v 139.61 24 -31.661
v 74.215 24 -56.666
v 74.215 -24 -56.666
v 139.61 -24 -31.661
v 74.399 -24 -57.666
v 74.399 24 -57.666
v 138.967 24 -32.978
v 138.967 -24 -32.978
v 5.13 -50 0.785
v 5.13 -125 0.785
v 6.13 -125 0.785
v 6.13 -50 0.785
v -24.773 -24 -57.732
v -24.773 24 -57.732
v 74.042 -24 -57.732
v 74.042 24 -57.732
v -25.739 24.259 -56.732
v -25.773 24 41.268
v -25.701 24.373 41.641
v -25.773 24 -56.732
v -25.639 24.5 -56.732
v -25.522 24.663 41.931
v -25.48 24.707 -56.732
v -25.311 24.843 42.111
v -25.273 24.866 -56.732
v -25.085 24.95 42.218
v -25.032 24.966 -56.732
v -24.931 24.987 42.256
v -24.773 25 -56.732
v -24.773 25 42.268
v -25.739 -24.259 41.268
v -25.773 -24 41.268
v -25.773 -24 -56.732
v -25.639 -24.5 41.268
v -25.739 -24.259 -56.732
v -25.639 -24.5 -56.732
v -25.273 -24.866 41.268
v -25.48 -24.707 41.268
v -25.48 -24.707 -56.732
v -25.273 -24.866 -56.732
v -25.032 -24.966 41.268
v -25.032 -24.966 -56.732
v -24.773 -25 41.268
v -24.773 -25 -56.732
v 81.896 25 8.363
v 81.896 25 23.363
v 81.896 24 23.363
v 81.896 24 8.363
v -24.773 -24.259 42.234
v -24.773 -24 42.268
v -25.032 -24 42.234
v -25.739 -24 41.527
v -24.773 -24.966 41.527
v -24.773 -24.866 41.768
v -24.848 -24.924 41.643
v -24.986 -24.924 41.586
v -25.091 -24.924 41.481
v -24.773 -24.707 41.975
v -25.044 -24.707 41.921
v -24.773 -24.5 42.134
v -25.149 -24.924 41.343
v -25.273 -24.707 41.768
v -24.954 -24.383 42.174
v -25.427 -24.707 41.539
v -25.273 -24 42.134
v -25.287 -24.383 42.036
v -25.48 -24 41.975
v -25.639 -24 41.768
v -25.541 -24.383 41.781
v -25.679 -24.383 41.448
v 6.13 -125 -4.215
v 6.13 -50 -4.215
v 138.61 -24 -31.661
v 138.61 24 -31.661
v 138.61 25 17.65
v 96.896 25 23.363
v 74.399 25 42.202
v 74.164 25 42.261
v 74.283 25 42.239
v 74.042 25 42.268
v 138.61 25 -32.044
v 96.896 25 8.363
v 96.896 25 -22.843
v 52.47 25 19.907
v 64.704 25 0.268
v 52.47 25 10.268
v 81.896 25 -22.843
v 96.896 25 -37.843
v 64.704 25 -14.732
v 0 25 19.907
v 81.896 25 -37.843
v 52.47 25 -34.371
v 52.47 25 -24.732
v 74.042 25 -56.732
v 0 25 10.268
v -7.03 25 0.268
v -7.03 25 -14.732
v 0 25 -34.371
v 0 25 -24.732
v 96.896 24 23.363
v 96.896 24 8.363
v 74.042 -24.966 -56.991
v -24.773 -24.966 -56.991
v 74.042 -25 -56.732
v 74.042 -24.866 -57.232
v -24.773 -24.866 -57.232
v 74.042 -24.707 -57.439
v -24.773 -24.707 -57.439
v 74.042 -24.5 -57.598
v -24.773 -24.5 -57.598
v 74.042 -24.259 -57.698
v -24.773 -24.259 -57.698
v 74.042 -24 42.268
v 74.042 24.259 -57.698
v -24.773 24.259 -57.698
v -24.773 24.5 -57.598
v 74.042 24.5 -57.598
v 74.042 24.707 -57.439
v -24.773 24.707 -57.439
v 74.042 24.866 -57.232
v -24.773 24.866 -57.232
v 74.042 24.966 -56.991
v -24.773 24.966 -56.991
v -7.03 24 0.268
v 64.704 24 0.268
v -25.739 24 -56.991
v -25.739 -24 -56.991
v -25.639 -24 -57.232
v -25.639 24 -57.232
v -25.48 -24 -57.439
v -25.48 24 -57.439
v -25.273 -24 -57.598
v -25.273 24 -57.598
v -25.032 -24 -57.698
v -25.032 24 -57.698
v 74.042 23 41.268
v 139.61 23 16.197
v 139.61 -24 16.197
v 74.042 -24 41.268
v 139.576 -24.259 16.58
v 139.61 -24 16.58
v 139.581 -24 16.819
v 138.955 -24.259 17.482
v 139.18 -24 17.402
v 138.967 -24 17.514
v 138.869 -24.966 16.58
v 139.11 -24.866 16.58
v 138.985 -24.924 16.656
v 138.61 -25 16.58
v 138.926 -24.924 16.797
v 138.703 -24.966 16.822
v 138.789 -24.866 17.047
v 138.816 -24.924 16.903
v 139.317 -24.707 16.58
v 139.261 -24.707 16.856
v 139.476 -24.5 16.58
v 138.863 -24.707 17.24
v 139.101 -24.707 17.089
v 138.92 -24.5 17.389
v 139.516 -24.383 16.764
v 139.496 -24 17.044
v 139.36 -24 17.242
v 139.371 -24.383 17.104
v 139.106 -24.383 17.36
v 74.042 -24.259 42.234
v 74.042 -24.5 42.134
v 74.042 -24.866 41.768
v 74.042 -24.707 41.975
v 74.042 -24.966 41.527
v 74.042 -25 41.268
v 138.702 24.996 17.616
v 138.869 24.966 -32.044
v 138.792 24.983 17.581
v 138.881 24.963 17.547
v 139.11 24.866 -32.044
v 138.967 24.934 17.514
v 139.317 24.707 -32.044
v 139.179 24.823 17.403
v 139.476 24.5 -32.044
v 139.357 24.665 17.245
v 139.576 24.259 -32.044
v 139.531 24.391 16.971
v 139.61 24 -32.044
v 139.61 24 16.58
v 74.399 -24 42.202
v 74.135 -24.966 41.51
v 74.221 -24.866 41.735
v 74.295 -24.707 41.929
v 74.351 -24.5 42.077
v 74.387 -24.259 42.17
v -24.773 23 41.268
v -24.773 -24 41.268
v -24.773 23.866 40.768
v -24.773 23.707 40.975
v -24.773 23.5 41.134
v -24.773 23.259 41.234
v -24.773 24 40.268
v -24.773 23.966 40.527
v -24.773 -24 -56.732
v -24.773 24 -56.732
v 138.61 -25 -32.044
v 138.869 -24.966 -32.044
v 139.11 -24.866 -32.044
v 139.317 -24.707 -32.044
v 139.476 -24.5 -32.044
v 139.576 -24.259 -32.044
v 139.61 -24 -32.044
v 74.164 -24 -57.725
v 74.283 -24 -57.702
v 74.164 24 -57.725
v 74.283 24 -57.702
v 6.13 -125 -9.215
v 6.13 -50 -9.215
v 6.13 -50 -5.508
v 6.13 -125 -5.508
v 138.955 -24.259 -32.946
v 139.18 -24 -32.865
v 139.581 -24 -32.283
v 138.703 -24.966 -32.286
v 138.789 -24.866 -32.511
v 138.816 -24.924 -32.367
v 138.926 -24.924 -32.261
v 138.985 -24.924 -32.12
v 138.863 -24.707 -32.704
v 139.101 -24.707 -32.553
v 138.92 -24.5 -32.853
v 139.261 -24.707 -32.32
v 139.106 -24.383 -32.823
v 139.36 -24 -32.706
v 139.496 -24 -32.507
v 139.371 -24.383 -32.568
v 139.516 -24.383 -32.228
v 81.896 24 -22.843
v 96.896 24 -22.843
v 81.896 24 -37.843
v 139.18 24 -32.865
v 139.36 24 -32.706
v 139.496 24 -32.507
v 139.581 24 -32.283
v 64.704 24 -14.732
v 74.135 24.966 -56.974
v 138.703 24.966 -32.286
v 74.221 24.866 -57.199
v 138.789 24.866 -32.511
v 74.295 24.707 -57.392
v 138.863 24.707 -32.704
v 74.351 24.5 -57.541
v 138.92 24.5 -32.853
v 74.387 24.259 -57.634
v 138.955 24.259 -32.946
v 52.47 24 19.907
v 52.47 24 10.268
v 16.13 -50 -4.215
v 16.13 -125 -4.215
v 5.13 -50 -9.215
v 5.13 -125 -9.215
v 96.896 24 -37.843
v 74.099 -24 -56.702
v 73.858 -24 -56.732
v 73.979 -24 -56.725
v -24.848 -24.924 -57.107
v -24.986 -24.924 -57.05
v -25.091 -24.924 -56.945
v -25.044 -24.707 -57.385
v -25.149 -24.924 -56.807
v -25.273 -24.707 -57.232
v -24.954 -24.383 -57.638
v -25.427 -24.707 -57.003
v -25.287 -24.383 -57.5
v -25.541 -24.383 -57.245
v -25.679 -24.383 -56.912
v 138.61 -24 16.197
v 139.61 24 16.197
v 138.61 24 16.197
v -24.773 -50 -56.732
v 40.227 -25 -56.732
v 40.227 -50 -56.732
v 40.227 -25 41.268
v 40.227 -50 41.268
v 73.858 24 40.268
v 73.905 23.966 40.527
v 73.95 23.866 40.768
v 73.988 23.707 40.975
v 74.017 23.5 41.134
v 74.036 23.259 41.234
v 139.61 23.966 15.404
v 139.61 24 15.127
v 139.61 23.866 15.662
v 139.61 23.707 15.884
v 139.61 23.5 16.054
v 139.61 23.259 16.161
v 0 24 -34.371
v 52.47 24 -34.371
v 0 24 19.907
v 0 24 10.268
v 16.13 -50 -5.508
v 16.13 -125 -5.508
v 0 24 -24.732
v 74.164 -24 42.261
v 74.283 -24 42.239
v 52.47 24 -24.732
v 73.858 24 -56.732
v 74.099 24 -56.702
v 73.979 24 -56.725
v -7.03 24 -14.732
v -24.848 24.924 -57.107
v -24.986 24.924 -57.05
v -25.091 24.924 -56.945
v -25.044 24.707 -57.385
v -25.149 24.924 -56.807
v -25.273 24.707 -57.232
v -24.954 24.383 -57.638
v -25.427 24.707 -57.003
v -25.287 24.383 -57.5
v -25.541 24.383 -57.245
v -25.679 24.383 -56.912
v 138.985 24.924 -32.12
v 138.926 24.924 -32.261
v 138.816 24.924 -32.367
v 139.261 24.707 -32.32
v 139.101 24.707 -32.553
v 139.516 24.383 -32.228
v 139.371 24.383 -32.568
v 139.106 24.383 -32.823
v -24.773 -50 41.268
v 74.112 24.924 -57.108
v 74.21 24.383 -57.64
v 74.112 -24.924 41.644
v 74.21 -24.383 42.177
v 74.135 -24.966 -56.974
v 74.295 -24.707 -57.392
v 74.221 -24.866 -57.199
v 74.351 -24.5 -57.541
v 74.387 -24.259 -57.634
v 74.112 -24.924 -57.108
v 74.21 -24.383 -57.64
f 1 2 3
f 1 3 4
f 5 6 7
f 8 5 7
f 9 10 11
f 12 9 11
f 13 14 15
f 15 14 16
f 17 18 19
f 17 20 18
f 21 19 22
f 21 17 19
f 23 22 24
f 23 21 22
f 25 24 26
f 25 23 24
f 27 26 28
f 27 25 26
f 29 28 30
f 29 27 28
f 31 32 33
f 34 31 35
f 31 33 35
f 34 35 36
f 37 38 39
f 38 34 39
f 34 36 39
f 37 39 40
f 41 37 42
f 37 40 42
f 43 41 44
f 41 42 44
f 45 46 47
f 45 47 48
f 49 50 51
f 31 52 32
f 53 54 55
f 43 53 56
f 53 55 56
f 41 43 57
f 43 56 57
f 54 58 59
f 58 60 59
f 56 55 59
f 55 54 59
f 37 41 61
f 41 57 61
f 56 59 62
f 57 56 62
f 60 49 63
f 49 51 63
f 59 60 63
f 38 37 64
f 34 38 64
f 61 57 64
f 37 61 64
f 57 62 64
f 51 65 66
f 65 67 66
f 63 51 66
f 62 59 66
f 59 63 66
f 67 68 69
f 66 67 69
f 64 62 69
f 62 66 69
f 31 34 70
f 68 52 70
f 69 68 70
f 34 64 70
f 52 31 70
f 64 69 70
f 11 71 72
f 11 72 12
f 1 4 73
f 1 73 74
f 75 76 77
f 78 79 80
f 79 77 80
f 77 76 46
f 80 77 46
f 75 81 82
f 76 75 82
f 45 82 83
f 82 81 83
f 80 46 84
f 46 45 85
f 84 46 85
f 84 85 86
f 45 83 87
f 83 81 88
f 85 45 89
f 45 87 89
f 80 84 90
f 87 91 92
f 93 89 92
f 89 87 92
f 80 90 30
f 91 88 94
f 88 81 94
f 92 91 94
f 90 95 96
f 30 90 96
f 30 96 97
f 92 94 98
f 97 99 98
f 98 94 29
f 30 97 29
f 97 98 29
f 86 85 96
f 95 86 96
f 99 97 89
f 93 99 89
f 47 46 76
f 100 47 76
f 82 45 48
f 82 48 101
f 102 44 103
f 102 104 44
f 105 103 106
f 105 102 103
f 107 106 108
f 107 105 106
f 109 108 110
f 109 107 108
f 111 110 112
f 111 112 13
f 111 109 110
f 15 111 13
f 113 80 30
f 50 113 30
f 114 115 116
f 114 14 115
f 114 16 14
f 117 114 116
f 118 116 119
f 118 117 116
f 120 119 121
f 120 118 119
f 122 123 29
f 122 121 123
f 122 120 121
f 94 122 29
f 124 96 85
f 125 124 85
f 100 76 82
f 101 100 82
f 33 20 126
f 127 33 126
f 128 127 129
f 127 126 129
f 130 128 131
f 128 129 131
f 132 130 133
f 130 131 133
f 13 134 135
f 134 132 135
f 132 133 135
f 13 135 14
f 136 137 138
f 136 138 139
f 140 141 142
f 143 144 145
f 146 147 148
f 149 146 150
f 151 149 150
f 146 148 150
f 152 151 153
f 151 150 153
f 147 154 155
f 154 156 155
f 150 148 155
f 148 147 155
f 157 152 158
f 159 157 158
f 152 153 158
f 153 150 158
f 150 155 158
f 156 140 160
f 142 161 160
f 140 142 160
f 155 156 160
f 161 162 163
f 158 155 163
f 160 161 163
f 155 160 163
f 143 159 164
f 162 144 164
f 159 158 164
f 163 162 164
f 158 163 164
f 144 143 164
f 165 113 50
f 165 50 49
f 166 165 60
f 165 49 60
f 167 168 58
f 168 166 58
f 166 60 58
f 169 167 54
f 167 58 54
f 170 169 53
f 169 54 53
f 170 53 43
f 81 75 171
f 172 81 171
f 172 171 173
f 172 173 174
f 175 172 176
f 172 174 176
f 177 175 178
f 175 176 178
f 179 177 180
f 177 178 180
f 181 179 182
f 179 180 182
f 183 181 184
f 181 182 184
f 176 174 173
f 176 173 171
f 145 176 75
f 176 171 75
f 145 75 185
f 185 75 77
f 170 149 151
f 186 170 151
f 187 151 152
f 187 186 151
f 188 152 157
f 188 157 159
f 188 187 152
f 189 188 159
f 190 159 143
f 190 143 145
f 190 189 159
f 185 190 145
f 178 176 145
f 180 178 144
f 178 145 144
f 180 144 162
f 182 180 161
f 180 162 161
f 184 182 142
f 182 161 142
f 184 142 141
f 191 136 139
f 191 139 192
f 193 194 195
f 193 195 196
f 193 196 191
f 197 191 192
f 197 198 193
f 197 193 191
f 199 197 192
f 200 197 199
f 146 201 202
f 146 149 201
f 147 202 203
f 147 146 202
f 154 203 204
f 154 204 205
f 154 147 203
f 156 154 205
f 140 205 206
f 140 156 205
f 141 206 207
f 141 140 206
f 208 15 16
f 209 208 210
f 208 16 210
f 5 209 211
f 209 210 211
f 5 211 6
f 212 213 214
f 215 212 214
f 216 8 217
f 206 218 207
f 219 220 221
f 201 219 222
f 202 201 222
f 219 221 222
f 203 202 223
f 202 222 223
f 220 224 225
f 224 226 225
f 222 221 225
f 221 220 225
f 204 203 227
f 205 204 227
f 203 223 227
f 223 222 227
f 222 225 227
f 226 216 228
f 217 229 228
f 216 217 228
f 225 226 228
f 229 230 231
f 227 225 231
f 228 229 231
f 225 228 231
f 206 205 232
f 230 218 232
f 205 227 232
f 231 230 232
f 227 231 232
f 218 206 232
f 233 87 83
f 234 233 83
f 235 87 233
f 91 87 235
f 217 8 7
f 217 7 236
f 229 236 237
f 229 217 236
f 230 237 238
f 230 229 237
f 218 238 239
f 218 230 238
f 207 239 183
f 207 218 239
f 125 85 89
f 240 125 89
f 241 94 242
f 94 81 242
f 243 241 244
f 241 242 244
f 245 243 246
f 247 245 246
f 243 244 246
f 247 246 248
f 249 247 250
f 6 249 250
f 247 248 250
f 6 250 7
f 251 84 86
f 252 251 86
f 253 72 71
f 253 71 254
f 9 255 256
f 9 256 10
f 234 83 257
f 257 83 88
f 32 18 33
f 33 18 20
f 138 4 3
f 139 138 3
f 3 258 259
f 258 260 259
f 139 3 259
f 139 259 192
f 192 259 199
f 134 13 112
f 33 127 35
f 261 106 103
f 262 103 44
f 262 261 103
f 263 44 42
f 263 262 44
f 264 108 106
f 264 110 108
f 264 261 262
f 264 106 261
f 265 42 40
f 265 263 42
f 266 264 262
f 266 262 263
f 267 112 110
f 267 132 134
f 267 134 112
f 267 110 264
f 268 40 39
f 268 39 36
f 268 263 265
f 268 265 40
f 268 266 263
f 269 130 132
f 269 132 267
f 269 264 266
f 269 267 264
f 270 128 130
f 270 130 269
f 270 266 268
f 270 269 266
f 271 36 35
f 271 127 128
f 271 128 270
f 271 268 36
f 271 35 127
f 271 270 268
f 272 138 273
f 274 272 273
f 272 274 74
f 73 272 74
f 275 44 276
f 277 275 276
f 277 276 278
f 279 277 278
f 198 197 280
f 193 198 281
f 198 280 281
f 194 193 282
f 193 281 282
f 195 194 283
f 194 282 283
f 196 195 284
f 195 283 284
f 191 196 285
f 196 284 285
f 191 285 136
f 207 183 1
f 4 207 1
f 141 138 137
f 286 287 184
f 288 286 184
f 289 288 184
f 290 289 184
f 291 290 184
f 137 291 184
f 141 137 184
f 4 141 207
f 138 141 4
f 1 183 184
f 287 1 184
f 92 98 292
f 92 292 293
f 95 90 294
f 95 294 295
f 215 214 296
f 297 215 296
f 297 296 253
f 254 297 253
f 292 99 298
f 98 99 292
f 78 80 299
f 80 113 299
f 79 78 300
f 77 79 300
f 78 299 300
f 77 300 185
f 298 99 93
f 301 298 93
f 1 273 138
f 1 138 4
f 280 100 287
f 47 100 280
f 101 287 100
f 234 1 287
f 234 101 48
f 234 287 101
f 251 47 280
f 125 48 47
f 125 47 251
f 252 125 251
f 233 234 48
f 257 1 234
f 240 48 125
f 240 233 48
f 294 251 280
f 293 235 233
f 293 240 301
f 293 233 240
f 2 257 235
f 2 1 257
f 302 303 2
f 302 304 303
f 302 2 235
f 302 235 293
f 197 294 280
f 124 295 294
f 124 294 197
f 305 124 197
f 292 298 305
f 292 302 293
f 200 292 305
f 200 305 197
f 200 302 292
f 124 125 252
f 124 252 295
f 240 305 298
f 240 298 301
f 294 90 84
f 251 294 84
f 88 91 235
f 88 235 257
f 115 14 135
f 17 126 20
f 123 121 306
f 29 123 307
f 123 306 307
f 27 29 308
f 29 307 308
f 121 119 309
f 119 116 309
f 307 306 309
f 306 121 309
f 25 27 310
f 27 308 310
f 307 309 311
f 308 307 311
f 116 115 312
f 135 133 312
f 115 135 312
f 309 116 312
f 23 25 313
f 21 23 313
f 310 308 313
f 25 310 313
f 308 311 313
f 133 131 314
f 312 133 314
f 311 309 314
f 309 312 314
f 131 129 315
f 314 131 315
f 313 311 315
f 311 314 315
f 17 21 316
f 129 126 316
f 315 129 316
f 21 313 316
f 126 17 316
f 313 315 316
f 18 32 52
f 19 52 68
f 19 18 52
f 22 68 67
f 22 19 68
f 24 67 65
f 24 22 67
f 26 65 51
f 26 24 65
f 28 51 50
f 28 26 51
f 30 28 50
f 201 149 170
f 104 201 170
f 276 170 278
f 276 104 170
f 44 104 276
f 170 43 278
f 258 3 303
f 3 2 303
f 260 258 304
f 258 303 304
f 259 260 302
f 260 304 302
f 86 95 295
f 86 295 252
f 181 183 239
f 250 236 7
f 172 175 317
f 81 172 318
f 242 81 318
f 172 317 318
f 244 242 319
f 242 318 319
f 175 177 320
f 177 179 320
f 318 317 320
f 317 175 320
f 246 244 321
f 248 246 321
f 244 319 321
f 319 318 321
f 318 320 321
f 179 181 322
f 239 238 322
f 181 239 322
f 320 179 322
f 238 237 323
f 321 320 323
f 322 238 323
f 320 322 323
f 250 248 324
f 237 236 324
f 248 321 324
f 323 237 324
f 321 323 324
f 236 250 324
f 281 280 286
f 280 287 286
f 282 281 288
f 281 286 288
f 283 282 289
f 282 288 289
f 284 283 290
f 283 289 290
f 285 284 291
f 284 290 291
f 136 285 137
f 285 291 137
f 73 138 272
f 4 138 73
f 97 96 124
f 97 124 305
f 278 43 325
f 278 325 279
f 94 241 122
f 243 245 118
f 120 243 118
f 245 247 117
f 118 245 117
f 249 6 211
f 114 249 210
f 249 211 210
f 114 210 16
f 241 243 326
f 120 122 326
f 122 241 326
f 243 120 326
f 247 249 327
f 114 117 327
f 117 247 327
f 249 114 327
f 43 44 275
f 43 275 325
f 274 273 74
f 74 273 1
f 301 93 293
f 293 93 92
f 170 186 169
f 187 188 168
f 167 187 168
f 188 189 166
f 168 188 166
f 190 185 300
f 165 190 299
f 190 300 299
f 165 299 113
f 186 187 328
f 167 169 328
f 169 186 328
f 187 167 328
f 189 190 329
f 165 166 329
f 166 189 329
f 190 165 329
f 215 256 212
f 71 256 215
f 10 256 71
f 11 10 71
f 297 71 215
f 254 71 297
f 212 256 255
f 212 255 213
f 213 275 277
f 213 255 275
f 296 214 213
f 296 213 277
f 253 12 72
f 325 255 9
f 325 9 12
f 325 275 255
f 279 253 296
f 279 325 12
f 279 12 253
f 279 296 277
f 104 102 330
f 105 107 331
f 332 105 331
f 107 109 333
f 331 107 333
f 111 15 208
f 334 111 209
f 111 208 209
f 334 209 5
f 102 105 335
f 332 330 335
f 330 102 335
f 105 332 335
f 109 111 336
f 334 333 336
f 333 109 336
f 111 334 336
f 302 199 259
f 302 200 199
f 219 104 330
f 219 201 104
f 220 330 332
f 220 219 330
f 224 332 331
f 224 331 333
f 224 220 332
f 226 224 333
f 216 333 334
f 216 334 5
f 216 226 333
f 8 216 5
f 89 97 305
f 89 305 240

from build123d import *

# Parameters (mm, degrees)
BOSS_EXTRUDE1_DEPTH  = 25
SHELL1_T             = -1
BOSS_EXTRUDE5_START  = 139.610288
SKETCH2_W            = 47.858786484
SKETCH2_H            = 48
BOSS_EXTRUDE5_DEPTH  = 1
BOSS_EXTRUDE6_START  = -25.773196
SKETCH3_W            = 98
SKETCH3_H            = 48
BOSS_EXTRUDE6_DEPTH  = 1
FILLET1_R            = 1
CUT_EXTRUDE1_START   = 25
SKETCH4_W            = 71.73360049
SKETCH4_H            = 15
CUT_EXTRUDE1_DEPTH   = 1
CUT_EXTRUDE3_START   = 25
SKETCH5_W            = 15
SKETCH5_H            = 15
CUT_EXTRUDE3_DEPTH   = 1
SKETCH7_W            = 65
SKETCH7_H            = 98
BOSS_EXTRUDE8_DEPTH  = 25
BOSS_EXTRUDE10_START = 25
SKETCH6_W            = 1
SKETCH6_H            = 10
BOSS_EXTRUDE10_DEPTH = 75
SKETCH8_W            = 10
SKETCH8_H            = 1.292837184
BOSS_EXTRUDE11_DEPTH = 75
SKETCH9_W            = 52.469950821
SKETCH9_H            = 9.638623322
CUT_EXTRUDE4_DEPTH   = 1


with BuildPart() as part:
    # Sketch1 → Boss-Extrude1 (new, symmetric)
    with BuildSketch(Plane(origin=(0, 0, 0), x_dir=(1, 0, 0), z_dir=(0, 1, 0))):
        Polygon((74.226804124, 57.731958763), (139.610288277, 32.731958763), (139.610288277, -17.268041237), (74.226804124, -42.268041237), (-25.773195876, -42.268041237), (-25.773195876, 57.731958763), align=None)
    extrude(amount=BOSS_EXTRUDE1_DEPTH, both=True)

    # Shell1
    shell1_openings = [part.faces().sort_by_distance(p)[0] for p in [
        (139.610288277, 0, -7.731958763),
        (-25.773195876, 0, -7.731958763),
    ]]
    offset(amount=SHELL1_T, openings=shell1_openings, kind=Kind.INTERSECTION)

    # Sketch3 → Boss-Extrude6 (add)
    with BuildSketch(Plane(origin=(0, 0, 0), x_dir=(0, 0, -1), z_dir=(1, 0, 0)).offset(BOSS_EXTRUDE6_START)):
        with Locations((7.731958763, 0)):
            Rectangle(SKETCH3_W, SKETCH3_H)
    extrude(amount=BOSS_EXTRUDE6_DEPTH)

    # Fillet1
    fillet1_edges = [part.edges().sort_by_distance(p)[0] for p in [
        (-25.773195876, 0, -57.731958763),
        (74.226804124, 0, -57.731958763),
        (139.610288277, 0, -32.731958763),
        (139.610288277, 0, 17.268041237),
        (74.226804124, 0, 42.268041237),
        (-25.773195876, 0, 42.268041237),
        (139.610288277, 25, -7.731958763),
        (106.9185462, 25, -45.231958763),
        (74.04214349, 0, -56.731958763),
        (24.226804124, 25, -57.731958763),
        (106.826215883, 24, 28.732737858),
        (24.634473745, 24, 41.268041237),
        (-25.773195876, 25, -7.731958763),
        (24.226804124, -25, -57.731958763),
        (106.9185462, -25, -45.231958763),
        (139.610288277, -25, -7.731958763),
        (106.9185462, -25, 29.768041237),
        (24.226804124, -25, 42.268041237),
        (-25.773195876, -25, -7.731958763),
    ]]
    fillet(fillet1_edges, radius=FILLET1_R - 0.0001)  # a hair under: the kernel refuses the full size

    # Sketch4 → Cut-Extrude1 (cut)
    with BuildSketch(Plane(origin=(0, 0, 0), x_dir=(1, 0, 0), z_dir=(0, 1, 0)).offset(CUT_EXTRUDE1_START)):
        with Locations((28.836787869, 7.231958763)):
            Rectangle(SKETCH4_W, SKETCH4_H)
    extrude(amount=-CUT_EXTRUDE1_DEPTH, mode=Mode.SUBTRACT)

    # Sketch5 → Cut-Extrude3 (cut)
    with BuildSketch(Plane(origin=(0, 0, 0), x_dir=(1, 0, 0), z_dir=(0, 1, 0)).offset(CUT_EXTRUDE3_START)):
        with Locations((89.396495287, 30.342973194)):
            Rectangle(SKETCH5_W, SKETCH5_H)
        with Locations((89.396495287, -15.863127894)):
            Rectangle(SKETCH5_W, SKETCH5_H)
    extrude(amount=-CUT_EXTRUDE3_DEPTH, mode=Mode.SUBTRACT)

    # Sketch7 → Boss-Extrude8 (add)
    with BuildSketch(Plane.XZ.offset(25)):
        with Locations((7.726804124, -7.731958763)):
            Rectangle(SKETCH7_W, SKETCH7_H)
    extrude(amount=BOSS_EXTRUDE8_DEPTH)

    # Sketch6 → Boss-Extrude10 (add)
    with BuildSketch(Plane.XZ.offset(25).offset(BOSS_EXTRUDE10_START)):
        with Locations((5.630415621, -4.214823889)):
            Rectangle(SKETCH6_W, SKETCH6_H)
    extrude(amount=BOSS_EXTRUDE10_DEPTH)

    # Sketch8 → Boss-Extrude11 (add)
    with BuildSketch(Plane.XZ.offset(50)):
        with Locations((11.130415621, -4.861242481)):
            Rectangle(SKETCH8_W, SKETCH8_H)
    extrude(amount=BOSS_EXTRUDE11_DEPTH)

    # Sketch9 → Cut-Extrude4 (cut)
    with BuildSketch(Plane(origin=(0, 25, 0), x_dir=(1, 0, 0), z_dir=(0, 1, 0))):
        with Locations((26.234975411, 29.551270424)):
            Rectangle(SKETCH9_W, SKETCH9_H)
        with Locations((26.234975411, -15.087352898)):
            Rectangle(SKETCH9_W, SKETCH9_H)
    extrude(amount=-CUT_EXTRUDE4_DEPTH, mode=Mode.SUBTRACT)


with BuildPart() as body_2:
    # Sketch2 → Boss-Extrude5 (new body)
    with BuildSketch(Plane(origin=(0, 0, 0), x_dir=(0, 0, -1), z_dir=(1, 0, 0)).offset(BOSS_EXTRUDE5_START)):
        with Locations((7.731958763, 0)):
            Rectangle(SKETCH2_W, SKETCH2_H)
    extrude(amount=-BOSS_EXTRUDE5_DEPTH)


solid = Compound([part.part, body_2.part])
